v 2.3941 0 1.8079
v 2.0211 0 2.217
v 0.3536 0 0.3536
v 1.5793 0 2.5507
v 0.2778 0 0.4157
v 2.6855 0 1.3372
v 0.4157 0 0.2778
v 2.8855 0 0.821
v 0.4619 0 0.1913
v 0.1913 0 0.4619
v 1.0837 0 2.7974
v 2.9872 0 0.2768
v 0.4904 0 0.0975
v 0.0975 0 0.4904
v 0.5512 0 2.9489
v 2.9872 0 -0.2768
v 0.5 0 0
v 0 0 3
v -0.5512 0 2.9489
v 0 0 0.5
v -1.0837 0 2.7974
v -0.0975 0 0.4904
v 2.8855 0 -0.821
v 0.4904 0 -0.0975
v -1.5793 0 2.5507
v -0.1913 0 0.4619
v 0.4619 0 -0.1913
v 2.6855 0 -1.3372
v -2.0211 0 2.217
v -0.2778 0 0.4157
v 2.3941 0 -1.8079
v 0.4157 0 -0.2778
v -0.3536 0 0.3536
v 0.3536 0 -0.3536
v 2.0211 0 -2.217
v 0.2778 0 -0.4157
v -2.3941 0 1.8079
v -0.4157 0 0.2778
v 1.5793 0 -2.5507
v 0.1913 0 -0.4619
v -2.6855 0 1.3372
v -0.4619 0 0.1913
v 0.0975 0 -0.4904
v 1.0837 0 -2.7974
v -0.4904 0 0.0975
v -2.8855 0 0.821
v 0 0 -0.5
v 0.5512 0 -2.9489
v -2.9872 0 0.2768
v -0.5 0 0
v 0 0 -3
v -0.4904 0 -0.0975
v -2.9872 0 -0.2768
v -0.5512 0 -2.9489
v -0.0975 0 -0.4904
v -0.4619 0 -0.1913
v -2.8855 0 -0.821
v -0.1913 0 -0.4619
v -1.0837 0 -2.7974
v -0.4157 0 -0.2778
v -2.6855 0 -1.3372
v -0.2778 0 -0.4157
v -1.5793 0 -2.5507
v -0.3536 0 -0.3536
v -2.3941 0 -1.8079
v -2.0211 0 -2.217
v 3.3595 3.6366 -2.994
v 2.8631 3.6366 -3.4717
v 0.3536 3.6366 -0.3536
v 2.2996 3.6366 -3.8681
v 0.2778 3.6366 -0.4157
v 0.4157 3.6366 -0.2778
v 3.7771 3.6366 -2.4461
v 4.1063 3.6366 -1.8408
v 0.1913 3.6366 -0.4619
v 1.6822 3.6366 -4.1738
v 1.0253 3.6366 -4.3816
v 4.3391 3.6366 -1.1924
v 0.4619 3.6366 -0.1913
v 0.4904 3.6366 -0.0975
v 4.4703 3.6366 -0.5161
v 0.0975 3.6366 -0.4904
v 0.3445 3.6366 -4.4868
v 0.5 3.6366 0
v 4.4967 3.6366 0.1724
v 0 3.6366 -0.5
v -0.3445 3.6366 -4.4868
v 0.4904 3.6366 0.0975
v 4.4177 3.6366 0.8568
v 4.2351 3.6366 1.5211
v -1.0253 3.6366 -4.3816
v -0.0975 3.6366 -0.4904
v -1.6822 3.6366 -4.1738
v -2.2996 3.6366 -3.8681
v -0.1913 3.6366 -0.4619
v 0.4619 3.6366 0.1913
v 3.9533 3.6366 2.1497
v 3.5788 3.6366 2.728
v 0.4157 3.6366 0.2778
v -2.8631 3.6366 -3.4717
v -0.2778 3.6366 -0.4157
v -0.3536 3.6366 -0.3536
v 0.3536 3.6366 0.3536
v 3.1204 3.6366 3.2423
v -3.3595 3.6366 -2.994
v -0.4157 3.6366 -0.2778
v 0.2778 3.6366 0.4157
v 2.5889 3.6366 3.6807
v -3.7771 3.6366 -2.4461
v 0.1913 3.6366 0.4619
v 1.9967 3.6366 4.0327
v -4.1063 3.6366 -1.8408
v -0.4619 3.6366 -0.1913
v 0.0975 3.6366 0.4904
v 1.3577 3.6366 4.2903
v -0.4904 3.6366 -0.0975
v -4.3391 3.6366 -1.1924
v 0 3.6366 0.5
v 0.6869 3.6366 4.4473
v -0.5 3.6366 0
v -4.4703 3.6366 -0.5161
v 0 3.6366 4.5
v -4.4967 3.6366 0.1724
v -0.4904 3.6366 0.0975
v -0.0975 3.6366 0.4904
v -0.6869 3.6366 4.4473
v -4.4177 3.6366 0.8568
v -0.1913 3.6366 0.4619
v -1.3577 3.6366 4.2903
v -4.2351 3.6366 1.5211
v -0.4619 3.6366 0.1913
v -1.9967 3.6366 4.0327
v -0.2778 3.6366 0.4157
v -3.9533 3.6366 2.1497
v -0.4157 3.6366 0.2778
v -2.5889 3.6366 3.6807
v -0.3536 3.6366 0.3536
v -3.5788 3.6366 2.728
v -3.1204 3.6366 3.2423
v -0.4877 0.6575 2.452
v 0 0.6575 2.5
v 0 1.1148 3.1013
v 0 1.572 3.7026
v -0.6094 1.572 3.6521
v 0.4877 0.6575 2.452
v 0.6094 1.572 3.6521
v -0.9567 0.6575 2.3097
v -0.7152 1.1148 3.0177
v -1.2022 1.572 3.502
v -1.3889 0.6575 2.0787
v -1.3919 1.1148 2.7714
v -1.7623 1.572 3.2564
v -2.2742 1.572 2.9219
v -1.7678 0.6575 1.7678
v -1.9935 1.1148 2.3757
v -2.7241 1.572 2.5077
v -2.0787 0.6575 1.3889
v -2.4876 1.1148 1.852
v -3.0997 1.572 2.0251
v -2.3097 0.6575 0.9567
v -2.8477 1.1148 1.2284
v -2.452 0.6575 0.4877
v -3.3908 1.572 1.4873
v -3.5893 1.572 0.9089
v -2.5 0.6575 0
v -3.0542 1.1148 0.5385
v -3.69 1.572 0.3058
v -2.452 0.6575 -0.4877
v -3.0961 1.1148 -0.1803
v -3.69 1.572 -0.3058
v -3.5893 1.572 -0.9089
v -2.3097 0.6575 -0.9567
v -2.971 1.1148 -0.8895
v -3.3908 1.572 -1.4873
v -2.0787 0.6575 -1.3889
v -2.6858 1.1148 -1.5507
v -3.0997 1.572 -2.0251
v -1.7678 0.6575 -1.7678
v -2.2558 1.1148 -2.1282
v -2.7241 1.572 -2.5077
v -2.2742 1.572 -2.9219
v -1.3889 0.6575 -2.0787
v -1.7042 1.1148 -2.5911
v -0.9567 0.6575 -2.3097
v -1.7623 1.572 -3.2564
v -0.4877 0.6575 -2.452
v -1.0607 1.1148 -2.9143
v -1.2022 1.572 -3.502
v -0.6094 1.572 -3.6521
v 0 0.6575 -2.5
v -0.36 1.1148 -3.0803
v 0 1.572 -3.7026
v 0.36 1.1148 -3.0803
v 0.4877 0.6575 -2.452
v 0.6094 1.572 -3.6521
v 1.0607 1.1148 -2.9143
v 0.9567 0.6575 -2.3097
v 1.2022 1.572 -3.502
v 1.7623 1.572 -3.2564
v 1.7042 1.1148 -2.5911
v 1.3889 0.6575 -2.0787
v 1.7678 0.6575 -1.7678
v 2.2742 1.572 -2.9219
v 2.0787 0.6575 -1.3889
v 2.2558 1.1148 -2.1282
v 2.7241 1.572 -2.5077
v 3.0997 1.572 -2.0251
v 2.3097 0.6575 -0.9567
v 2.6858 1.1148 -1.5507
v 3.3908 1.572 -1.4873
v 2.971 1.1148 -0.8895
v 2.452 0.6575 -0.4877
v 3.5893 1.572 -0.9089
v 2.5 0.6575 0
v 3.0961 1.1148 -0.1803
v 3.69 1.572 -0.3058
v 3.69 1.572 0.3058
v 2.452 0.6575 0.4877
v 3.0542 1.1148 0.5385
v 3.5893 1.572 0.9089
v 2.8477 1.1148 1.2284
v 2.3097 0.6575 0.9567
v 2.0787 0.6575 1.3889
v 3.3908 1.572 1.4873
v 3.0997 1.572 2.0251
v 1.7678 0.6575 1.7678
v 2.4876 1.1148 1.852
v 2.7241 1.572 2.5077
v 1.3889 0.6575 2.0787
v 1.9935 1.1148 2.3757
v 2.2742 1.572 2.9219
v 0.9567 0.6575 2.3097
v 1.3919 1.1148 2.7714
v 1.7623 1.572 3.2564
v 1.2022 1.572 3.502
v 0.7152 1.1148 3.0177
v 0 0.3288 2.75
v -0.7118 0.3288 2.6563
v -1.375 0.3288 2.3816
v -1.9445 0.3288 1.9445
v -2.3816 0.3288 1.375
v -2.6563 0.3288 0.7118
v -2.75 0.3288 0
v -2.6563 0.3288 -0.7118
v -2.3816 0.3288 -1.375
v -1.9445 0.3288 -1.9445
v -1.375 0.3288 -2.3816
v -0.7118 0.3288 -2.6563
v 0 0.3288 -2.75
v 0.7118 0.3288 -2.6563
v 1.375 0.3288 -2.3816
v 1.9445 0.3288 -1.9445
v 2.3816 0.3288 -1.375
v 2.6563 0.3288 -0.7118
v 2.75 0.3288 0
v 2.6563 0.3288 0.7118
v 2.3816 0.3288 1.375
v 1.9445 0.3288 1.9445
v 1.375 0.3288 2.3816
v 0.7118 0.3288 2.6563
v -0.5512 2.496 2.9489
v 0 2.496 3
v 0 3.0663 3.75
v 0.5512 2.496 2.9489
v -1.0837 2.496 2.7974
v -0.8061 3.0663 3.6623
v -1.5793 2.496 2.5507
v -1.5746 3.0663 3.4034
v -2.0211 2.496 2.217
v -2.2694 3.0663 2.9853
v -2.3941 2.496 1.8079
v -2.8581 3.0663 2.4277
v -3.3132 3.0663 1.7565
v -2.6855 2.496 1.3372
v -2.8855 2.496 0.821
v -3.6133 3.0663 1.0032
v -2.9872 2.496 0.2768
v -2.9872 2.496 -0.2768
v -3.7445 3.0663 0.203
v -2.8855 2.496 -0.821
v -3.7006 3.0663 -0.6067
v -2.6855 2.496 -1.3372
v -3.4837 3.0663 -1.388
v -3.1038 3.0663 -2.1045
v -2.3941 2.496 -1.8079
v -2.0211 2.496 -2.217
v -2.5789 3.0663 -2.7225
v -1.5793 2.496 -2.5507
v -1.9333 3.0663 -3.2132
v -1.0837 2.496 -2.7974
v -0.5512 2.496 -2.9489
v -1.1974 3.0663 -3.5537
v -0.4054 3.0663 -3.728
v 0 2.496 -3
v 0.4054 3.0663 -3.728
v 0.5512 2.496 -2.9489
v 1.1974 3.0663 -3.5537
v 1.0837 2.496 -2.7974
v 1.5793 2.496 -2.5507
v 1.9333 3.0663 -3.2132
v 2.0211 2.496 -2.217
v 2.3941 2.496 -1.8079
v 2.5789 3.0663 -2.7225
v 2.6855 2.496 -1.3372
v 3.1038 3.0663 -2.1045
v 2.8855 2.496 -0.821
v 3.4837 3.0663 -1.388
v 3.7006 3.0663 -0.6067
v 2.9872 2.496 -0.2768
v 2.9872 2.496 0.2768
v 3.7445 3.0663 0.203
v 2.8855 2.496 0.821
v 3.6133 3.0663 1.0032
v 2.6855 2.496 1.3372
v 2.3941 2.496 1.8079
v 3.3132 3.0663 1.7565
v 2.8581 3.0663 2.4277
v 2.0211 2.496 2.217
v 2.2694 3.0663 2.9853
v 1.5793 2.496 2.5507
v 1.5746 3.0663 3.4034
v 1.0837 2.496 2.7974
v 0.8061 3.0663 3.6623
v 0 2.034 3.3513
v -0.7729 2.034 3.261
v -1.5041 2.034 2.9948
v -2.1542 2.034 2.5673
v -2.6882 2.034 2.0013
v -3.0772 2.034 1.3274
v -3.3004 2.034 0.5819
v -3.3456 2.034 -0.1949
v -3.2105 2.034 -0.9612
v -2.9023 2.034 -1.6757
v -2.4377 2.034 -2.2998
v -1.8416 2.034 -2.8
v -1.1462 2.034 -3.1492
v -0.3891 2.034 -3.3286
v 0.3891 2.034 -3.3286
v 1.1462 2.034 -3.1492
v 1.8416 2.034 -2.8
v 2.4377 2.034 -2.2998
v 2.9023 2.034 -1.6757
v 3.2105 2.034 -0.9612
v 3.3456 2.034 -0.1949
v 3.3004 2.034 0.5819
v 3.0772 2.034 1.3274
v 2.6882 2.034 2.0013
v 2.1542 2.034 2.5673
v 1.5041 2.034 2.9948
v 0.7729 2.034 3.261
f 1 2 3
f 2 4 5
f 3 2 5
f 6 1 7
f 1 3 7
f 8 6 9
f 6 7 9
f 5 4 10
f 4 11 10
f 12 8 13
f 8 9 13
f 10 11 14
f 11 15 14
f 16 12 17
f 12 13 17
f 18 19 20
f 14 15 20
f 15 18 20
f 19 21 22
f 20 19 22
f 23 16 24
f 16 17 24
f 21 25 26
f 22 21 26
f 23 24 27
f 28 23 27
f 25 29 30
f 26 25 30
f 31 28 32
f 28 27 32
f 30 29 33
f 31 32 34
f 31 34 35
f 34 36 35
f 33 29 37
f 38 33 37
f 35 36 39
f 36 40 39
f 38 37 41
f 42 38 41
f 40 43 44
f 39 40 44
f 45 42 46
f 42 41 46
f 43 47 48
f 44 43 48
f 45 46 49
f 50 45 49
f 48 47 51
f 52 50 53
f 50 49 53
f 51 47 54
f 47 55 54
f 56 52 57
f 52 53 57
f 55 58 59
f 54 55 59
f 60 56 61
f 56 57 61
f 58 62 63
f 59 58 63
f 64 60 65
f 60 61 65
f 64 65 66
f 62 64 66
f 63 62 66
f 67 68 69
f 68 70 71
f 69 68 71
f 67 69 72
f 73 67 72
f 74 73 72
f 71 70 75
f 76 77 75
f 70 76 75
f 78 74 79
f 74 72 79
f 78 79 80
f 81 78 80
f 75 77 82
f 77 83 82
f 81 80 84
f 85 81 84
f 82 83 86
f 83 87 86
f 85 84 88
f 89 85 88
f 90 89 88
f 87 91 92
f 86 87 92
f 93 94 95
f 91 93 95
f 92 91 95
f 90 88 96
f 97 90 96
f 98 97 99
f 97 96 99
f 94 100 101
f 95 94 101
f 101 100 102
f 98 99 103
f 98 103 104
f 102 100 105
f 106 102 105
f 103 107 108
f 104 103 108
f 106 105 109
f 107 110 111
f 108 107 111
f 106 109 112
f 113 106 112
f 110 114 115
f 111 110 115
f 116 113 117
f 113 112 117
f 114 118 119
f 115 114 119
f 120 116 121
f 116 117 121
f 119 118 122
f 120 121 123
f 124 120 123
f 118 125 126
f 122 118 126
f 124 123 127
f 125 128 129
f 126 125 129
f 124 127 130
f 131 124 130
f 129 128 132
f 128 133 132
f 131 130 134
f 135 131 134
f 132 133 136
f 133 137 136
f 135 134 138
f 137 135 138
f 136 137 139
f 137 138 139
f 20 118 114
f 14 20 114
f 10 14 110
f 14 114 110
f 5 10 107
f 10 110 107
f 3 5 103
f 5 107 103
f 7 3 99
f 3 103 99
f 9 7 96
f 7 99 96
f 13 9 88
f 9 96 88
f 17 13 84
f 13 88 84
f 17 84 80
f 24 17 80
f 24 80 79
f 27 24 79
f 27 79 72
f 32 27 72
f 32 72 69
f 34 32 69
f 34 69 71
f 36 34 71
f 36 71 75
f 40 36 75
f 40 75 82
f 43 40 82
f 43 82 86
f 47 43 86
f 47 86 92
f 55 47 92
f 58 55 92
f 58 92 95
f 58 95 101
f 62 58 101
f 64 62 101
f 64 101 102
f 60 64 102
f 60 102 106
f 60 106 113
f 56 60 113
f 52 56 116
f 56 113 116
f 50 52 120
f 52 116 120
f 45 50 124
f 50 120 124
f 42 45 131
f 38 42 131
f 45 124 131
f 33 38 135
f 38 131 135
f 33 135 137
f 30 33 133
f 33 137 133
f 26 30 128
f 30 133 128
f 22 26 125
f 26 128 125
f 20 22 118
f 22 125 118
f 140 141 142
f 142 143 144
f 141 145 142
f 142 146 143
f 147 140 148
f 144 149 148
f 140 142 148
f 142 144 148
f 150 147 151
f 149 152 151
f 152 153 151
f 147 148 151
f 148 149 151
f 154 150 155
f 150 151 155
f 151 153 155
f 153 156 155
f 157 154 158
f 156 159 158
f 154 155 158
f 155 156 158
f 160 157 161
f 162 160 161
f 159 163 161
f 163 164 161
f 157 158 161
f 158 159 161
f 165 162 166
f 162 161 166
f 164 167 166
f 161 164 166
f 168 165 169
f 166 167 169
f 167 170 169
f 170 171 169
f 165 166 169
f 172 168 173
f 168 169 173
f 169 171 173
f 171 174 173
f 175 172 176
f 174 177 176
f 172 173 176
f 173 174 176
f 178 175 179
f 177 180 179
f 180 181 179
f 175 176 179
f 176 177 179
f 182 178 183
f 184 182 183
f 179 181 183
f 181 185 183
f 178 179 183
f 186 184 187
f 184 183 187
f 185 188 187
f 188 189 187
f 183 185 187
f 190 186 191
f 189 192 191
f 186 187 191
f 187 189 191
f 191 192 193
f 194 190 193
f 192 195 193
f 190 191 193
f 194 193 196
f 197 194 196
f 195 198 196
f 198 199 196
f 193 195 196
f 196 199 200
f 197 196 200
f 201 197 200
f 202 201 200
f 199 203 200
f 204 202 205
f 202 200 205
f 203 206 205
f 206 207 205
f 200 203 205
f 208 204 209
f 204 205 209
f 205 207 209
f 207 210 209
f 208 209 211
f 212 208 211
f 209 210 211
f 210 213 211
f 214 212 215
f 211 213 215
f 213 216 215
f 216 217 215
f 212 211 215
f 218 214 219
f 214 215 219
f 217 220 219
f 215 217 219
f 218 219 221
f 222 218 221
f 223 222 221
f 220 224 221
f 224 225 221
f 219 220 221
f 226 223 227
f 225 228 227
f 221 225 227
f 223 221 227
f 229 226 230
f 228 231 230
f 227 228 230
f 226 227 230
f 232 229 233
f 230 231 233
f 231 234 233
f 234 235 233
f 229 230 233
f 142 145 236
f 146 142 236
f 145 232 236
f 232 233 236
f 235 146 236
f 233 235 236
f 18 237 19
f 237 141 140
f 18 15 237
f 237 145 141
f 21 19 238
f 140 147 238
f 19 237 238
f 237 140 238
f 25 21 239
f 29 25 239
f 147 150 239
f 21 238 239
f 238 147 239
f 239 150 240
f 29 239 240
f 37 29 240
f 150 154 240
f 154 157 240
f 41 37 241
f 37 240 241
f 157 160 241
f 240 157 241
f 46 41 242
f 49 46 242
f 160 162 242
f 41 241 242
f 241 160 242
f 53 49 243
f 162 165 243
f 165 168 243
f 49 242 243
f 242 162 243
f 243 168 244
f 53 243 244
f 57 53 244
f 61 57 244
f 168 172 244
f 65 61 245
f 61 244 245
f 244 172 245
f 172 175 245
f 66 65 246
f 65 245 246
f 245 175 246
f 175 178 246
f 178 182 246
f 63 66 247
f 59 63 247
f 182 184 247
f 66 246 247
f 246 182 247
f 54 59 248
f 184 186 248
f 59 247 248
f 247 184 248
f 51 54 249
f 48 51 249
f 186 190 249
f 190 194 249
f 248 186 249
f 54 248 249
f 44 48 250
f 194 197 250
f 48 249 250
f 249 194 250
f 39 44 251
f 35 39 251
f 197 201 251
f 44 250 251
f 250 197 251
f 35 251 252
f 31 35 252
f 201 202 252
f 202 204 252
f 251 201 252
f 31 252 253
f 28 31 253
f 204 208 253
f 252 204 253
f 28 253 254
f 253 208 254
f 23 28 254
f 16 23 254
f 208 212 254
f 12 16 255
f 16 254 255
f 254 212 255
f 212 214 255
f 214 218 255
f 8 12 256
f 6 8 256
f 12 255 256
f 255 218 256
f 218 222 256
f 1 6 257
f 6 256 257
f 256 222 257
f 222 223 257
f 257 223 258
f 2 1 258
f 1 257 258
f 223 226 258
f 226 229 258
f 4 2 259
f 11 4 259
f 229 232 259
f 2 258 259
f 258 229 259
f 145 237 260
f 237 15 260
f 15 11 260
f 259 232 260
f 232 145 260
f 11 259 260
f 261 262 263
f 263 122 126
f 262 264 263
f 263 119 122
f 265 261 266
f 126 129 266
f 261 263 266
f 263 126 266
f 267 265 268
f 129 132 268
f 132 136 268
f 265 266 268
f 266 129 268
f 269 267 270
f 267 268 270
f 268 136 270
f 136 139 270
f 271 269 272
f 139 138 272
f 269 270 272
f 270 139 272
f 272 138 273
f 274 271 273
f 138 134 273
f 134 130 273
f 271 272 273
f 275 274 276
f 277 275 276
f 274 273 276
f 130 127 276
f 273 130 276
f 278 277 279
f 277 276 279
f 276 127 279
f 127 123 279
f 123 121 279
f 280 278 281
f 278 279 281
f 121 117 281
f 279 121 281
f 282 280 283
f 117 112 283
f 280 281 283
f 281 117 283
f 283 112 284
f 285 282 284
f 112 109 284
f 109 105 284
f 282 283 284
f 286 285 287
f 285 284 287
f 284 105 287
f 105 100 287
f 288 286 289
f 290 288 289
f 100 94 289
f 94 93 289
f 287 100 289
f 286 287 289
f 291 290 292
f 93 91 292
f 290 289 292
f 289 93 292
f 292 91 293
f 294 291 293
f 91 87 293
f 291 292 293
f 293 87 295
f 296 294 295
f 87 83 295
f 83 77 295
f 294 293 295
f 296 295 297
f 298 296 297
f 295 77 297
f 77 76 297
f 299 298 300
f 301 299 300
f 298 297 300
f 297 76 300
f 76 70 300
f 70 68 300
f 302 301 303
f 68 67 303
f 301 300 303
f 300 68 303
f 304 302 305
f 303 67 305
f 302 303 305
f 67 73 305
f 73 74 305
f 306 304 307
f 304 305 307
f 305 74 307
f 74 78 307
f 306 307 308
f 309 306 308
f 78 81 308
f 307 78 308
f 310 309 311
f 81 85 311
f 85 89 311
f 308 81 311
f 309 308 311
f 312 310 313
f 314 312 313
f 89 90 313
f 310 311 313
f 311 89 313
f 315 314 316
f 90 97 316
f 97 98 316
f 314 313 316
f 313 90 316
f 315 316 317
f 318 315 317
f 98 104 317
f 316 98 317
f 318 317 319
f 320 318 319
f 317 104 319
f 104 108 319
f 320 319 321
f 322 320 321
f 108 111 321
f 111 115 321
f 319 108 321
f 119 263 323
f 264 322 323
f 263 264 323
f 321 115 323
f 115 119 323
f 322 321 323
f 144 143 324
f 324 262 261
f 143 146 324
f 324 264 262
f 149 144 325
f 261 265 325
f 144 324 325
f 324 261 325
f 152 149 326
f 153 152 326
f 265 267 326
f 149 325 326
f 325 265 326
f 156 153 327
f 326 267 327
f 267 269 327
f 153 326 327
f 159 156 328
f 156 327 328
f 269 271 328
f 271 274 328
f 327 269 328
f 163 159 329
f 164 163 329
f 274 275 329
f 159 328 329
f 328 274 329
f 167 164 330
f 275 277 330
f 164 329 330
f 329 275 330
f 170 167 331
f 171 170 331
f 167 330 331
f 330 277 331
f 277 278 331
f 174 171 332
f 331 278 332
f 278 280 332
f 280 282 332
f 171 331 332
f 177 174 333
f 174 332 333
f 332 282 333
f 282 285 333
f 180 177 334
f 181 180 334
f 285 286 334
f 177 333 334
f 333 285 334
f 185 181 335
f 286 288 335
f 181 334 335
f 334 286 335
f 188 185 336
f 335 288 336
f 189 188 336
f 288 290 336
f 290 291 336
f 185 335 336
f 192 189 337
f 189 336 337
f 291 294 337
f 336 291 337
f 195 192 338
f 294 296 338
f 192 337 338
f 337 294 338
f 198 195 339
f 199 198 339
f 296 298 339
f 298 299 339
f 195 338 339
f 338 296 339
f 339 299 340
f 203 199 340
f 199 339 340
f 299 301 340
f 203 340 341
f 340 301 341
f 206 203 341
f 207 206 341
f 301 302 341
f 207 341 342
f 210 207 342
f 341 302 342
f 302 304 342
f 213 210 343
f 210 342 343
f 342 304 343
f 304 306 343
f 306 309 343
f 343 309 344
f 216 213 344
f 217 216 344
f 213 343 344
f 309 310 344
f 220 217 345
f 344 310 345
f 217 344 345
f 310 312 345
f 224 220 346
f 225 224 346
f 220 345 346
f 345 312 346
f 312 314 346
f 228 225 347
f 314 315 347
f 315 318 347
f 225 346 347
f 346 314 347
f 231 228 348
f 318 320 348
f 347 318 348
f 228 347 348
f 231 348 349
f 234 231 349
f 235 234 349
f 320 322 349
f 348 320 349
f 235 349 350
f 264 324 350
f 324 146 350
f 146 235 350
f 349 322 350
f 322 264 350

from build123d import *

# Parameters (mm, degrees)
SKETCH2_R          = 0.5
CUT_EXTRUDE1_DEPTH = 8.329743599


with BuildPart() as part:
    # Sketch1 → Revolve1 (revolve)
    with BuildSketch(Plane.XY, mode=Mode.PRIVATE) as revolve1_sk:
        Polygon((0, 0), (3, 0), (2.5, 0.657540642), (3.702619215, 1.572023442), (3, 2.496024821), (4.5, 3.636638726), (0, 3.636638726), align=None)
    revolve(revolve1_sk.sketch.rotate(Axis((0, 3.636638726, 0), (0, -1, 0)), 90), axis=Axis((0, 3.636638726, 0), (0, -1, 0)))

    # Sketch2 → Cut-Extrude1 (cut, through all)
    with BuildSketch(Plane(origin=(0, 3.636638726, 0), x_dir=(1, 0, 0), z_dir=(0, 1, 0))):
        with Locations(Location((0, 0, 0), (0, 0, 270))):
            Circle(SKETCH2_R)
    extrude(amount=-CUT_EXTRUDE1_DEPTH, mode=Mode.SUBTRACT)


solid = part.part
